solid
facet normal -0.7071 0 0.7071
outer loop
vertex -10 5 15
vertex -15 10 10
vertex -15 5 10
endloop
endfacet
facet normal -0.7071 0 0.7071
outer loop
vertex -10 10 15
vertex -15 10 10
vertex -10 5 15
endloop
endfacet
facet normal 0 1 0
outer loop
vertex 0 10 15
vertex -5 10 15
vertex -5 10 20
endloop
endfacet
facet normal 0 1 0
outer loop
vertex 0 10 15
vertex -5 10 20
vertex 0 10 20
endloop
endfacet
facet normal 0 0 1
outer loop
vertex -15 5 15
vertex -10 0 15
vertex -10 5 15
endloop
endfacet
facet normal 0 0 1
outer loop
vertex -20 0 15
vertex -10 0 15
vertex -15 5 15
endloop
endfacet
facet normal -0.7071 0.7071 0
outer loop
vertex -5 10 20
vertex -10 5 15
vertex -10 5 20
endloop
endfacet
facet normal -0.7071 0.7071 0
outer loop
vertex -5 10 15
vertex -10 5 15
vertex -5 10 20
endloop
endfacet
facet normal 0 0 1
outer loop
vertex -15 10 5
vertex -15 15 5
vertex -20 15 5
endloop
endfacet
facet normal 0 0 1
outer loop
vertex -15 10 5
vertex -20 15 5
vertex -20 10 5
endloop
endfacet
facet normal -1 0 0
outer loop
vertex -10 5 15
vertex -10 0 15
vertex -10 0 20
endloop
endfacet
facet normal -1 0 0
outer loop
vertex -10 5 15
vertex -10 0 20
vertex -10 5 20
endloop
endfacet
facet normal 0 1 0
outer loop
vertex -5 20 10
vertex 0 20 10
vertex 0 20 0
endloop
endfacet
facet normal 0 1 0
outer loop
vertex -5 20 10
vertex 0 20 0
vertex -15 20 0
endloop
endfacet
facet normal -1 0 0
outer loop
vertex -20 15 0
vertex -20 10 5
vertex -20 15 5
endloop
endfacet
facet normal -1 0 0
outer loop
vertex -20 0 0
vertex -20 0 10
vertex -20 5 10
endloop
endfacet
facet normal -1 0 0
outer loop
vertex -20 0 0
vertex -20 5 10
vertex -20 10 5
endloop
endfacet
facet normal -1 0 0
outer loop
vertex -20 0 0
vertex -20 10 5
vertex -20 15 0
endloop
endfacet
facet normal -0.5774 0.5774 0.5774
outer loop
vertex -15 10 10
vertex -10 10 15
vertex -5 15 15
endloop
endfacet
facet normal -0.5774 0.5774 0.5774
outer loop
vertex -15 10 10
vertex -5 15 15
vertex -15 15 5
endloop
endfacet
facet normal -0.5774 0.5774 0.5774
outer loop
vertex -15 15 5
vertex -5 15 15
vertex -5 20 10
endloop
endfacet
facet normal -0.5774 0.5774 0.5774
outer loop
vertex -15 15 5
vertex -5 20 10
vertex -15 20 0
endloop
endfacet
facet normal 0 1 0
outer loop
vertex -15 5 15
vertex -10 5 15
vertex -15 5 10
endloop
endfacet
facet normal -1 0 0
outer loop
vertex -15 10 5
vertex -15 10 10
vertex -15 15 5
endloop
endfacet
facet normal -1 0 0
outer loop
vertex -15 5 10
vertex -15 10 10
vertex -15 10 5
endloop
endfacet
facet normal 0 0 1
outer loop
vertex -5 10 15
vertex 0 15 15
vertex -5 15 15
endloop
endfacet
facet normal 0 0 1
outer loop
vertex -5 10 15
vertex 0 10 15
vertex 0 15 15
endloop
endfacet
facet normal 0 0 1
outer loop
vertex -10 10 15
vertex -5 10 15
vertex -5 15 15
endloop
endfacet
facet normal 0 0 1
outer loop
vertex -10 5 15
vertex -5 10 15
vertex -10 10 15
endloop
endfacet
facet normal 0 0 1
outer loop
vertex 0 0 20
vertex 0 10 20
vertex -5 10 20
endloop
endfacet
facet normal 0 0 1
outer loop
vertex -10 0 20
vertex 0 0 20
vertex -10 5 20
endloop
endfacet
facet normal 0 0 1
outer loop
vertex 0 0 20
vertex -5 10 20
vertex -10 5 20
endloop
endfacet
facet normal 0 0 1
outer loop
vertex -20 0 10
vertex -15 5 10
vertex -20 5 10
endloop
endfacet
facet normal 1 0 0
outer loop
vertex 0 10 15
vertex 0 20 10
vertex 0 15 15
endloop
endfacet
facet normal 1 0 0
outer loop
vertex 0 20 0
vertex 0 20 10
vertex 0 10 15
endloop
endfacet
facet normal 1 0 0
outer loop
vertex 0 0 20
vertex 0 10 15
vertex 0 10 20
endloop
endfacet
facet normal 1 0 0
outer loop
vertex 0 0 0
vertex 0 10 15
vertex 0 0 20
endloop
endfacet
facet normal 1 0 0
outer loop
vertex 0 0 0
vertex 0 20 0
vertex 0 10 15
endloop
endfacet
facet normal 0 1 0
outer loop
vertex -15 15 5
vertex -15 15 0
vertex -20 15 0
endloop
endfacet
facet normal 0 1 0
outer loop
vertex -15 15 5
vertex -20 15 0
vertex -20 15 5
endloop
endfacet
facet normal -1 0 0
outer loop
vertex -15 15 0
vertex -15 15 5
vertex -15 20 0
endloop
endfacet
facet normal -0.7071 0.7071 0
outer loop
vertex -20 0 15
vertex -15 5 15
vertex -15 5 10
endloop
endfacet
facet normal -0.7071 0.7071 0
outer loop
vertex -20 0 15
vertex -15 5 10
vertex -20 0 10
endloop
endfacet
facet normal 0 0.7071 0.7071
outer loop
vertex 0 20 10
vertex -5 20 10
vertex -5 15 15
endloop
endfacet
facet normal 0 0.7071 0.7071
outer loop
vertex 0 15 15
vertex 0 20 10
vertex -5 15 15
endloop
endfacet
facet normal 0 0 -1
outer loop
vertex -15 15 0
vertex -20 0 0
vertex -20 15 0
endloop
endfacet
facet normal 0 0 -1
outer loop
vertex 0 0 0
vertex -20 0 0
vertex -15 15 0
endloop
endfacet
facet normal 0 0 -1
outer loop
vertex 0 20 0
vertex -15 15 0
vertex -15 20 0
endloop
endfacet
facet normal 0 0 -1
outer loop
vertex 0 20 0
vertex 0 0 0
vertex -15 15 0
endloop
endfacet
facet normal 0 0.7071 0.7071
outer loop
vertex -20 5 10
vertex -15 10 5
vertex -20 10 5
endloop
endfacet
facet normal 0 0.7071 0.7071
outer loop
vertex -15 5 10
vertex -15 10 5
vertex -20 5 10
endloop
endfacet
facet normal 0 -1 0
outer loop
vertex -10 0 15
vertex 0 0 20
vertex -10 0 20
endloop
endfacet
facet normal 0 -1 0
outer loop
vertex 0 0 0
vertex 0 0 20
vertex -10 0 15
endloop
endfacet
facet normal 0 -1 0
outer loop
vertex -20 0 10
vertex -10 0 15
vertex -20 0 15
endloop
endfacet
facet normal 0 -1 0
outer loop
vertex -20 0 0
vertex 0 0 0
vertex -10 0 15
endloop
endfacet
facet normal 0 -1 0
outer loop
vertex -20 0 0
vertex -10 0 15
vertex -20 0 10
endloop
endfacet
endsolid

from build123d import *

# Parameters (mm, degrees)
BOSS_EXTRUDE1_DEPTH = 20
CUT_EXTRUDE5_DEPTH  = 30
BOSS_EXTRUDE5_DEPTH = 20
CUT_EXTRUDE9_DEPTH  = 22
CUT_EXTRUDE10_DEPTH = 22
BOSS_EXTRUDE6_DEPTH = 5
BOSS_EXTRUDE7_DEPTH = 5
BOSS_EXTRUDE8_DEPTH = 5
CUT_EXTRUDE11_DEPTH = 5


with BuildPart() as part:
    # Sketch1 → Boss-Extrude1 (new body)
    with BuildSketch(Plane(origin=(0, 0, 0), x_dir=(1, 0, 0), z_dir=(0, 1, 0))):
        Polygon((-15, 0), (0, 0), (0, -15), (-5, -15), (-5, -10), align=None)
    extrude(amount=BOSS_EXTRUDE1_DEPTH)

    # Sketch8 → Cut-Extrude5 (cut)
    with BuildSketch(Plane.ZY.offset(5)):
        Polygon((10, 20), (15, 15), (15, 20), align=None)
    extrude(amount=-CUT_EXTRUDE5_DEPTH, mode=Mode.SUBTRACT)

    # Sketch9 → Boss-Extrude5 (add)
    with BuildSketch(Plane(origin=(0, 0, 0), x_dir=(-1, 0, 0), z_dir=(0, -1, 0))):
        Polygon((15, 0), (5, -10), (5, -15), (15, -15), align=None)
    extrude(amount=-BOSS_EXTRUDE5_DEPTH)

    # 3DSketch3 → Cut-Extrude9 (cut, along a direction that is not the sketch's normal)
    with BuildSketch(Plane(origin=(-15, 20, 0), x_dir=(0.2672612419124245, -0.5345224838248489, 0.8017837257372732), z_dir=(-0.5773502691896256, 0.5773502691896258, 0.5773502691896258))):
        Polygon((0, 0), (10.690449676, 9.258200998), (17.371980724, 6.943650748), (18.708286934, 0), (13.363062096, -4.629100499), align=None)
    extrude(amount=CUT_EXTRUDE9_DEPTH, dir=(0, 0, 1), mode=Mode.SUBTRACT)

    # Sketch11 → Cut-Extrude10 (cut)
    with BuildSketch(Plane(origin=(0, 10, 0), x_dir=(1, 0, 0), z_dir=(0, 1, 0))):
        Polygon((-15, -10), (-10, -15), (-15, -15), align=None)
    extrude(amount=-CUT_EXTRUDE10_DEPTH, mode=Mode.SUBTRACT)

    # Sketch12 → Boss-Extrude6 (add)
    with BuildSketch(Plane.XY.offset(15)):
        Polygon((-5, 10), (0, 10), (0, 0), (-10, 0), (-10, 5), align=None)
    extrude(amount=BOSS_EXTRUDE6_DEPTH)

    # Sketch13 → Boss-Extrude7 (add)
    with BuildSketch(Plane.ZY.offset(15)):
        Polygon((0, 0), (0, 15), (5, 15), (5, 10), (10, 5), (10, 0), align=None)
    extrude(amount=BOSS_EXTRUDE7_DEPTH)

    # Sketch14 → Boss-Extrude8 (add)
    with BuildSketch(Plane(origin=(0, 0, 0), x_dir=(-1, 0, 0), z_dir=(0, -1, 0))):
        Polygon((20, -10), (15, -10), (10, -15), (20, -15), align=None)
    extrude(amount=-BOSS_EXTRUDE8_DEPTH)

    # Sketch15 → Cut-Extrude11 (cut)
    with BuildSketch(Plane.XY.offset(15)):
        Polygon((-20, 0), (-20, 5), (-15, 5), align=None)
    extrude(amount=-CUT_EXTRUDE11_DEPTH, mode=Mode.SUBTRACT)


solid = part.part
